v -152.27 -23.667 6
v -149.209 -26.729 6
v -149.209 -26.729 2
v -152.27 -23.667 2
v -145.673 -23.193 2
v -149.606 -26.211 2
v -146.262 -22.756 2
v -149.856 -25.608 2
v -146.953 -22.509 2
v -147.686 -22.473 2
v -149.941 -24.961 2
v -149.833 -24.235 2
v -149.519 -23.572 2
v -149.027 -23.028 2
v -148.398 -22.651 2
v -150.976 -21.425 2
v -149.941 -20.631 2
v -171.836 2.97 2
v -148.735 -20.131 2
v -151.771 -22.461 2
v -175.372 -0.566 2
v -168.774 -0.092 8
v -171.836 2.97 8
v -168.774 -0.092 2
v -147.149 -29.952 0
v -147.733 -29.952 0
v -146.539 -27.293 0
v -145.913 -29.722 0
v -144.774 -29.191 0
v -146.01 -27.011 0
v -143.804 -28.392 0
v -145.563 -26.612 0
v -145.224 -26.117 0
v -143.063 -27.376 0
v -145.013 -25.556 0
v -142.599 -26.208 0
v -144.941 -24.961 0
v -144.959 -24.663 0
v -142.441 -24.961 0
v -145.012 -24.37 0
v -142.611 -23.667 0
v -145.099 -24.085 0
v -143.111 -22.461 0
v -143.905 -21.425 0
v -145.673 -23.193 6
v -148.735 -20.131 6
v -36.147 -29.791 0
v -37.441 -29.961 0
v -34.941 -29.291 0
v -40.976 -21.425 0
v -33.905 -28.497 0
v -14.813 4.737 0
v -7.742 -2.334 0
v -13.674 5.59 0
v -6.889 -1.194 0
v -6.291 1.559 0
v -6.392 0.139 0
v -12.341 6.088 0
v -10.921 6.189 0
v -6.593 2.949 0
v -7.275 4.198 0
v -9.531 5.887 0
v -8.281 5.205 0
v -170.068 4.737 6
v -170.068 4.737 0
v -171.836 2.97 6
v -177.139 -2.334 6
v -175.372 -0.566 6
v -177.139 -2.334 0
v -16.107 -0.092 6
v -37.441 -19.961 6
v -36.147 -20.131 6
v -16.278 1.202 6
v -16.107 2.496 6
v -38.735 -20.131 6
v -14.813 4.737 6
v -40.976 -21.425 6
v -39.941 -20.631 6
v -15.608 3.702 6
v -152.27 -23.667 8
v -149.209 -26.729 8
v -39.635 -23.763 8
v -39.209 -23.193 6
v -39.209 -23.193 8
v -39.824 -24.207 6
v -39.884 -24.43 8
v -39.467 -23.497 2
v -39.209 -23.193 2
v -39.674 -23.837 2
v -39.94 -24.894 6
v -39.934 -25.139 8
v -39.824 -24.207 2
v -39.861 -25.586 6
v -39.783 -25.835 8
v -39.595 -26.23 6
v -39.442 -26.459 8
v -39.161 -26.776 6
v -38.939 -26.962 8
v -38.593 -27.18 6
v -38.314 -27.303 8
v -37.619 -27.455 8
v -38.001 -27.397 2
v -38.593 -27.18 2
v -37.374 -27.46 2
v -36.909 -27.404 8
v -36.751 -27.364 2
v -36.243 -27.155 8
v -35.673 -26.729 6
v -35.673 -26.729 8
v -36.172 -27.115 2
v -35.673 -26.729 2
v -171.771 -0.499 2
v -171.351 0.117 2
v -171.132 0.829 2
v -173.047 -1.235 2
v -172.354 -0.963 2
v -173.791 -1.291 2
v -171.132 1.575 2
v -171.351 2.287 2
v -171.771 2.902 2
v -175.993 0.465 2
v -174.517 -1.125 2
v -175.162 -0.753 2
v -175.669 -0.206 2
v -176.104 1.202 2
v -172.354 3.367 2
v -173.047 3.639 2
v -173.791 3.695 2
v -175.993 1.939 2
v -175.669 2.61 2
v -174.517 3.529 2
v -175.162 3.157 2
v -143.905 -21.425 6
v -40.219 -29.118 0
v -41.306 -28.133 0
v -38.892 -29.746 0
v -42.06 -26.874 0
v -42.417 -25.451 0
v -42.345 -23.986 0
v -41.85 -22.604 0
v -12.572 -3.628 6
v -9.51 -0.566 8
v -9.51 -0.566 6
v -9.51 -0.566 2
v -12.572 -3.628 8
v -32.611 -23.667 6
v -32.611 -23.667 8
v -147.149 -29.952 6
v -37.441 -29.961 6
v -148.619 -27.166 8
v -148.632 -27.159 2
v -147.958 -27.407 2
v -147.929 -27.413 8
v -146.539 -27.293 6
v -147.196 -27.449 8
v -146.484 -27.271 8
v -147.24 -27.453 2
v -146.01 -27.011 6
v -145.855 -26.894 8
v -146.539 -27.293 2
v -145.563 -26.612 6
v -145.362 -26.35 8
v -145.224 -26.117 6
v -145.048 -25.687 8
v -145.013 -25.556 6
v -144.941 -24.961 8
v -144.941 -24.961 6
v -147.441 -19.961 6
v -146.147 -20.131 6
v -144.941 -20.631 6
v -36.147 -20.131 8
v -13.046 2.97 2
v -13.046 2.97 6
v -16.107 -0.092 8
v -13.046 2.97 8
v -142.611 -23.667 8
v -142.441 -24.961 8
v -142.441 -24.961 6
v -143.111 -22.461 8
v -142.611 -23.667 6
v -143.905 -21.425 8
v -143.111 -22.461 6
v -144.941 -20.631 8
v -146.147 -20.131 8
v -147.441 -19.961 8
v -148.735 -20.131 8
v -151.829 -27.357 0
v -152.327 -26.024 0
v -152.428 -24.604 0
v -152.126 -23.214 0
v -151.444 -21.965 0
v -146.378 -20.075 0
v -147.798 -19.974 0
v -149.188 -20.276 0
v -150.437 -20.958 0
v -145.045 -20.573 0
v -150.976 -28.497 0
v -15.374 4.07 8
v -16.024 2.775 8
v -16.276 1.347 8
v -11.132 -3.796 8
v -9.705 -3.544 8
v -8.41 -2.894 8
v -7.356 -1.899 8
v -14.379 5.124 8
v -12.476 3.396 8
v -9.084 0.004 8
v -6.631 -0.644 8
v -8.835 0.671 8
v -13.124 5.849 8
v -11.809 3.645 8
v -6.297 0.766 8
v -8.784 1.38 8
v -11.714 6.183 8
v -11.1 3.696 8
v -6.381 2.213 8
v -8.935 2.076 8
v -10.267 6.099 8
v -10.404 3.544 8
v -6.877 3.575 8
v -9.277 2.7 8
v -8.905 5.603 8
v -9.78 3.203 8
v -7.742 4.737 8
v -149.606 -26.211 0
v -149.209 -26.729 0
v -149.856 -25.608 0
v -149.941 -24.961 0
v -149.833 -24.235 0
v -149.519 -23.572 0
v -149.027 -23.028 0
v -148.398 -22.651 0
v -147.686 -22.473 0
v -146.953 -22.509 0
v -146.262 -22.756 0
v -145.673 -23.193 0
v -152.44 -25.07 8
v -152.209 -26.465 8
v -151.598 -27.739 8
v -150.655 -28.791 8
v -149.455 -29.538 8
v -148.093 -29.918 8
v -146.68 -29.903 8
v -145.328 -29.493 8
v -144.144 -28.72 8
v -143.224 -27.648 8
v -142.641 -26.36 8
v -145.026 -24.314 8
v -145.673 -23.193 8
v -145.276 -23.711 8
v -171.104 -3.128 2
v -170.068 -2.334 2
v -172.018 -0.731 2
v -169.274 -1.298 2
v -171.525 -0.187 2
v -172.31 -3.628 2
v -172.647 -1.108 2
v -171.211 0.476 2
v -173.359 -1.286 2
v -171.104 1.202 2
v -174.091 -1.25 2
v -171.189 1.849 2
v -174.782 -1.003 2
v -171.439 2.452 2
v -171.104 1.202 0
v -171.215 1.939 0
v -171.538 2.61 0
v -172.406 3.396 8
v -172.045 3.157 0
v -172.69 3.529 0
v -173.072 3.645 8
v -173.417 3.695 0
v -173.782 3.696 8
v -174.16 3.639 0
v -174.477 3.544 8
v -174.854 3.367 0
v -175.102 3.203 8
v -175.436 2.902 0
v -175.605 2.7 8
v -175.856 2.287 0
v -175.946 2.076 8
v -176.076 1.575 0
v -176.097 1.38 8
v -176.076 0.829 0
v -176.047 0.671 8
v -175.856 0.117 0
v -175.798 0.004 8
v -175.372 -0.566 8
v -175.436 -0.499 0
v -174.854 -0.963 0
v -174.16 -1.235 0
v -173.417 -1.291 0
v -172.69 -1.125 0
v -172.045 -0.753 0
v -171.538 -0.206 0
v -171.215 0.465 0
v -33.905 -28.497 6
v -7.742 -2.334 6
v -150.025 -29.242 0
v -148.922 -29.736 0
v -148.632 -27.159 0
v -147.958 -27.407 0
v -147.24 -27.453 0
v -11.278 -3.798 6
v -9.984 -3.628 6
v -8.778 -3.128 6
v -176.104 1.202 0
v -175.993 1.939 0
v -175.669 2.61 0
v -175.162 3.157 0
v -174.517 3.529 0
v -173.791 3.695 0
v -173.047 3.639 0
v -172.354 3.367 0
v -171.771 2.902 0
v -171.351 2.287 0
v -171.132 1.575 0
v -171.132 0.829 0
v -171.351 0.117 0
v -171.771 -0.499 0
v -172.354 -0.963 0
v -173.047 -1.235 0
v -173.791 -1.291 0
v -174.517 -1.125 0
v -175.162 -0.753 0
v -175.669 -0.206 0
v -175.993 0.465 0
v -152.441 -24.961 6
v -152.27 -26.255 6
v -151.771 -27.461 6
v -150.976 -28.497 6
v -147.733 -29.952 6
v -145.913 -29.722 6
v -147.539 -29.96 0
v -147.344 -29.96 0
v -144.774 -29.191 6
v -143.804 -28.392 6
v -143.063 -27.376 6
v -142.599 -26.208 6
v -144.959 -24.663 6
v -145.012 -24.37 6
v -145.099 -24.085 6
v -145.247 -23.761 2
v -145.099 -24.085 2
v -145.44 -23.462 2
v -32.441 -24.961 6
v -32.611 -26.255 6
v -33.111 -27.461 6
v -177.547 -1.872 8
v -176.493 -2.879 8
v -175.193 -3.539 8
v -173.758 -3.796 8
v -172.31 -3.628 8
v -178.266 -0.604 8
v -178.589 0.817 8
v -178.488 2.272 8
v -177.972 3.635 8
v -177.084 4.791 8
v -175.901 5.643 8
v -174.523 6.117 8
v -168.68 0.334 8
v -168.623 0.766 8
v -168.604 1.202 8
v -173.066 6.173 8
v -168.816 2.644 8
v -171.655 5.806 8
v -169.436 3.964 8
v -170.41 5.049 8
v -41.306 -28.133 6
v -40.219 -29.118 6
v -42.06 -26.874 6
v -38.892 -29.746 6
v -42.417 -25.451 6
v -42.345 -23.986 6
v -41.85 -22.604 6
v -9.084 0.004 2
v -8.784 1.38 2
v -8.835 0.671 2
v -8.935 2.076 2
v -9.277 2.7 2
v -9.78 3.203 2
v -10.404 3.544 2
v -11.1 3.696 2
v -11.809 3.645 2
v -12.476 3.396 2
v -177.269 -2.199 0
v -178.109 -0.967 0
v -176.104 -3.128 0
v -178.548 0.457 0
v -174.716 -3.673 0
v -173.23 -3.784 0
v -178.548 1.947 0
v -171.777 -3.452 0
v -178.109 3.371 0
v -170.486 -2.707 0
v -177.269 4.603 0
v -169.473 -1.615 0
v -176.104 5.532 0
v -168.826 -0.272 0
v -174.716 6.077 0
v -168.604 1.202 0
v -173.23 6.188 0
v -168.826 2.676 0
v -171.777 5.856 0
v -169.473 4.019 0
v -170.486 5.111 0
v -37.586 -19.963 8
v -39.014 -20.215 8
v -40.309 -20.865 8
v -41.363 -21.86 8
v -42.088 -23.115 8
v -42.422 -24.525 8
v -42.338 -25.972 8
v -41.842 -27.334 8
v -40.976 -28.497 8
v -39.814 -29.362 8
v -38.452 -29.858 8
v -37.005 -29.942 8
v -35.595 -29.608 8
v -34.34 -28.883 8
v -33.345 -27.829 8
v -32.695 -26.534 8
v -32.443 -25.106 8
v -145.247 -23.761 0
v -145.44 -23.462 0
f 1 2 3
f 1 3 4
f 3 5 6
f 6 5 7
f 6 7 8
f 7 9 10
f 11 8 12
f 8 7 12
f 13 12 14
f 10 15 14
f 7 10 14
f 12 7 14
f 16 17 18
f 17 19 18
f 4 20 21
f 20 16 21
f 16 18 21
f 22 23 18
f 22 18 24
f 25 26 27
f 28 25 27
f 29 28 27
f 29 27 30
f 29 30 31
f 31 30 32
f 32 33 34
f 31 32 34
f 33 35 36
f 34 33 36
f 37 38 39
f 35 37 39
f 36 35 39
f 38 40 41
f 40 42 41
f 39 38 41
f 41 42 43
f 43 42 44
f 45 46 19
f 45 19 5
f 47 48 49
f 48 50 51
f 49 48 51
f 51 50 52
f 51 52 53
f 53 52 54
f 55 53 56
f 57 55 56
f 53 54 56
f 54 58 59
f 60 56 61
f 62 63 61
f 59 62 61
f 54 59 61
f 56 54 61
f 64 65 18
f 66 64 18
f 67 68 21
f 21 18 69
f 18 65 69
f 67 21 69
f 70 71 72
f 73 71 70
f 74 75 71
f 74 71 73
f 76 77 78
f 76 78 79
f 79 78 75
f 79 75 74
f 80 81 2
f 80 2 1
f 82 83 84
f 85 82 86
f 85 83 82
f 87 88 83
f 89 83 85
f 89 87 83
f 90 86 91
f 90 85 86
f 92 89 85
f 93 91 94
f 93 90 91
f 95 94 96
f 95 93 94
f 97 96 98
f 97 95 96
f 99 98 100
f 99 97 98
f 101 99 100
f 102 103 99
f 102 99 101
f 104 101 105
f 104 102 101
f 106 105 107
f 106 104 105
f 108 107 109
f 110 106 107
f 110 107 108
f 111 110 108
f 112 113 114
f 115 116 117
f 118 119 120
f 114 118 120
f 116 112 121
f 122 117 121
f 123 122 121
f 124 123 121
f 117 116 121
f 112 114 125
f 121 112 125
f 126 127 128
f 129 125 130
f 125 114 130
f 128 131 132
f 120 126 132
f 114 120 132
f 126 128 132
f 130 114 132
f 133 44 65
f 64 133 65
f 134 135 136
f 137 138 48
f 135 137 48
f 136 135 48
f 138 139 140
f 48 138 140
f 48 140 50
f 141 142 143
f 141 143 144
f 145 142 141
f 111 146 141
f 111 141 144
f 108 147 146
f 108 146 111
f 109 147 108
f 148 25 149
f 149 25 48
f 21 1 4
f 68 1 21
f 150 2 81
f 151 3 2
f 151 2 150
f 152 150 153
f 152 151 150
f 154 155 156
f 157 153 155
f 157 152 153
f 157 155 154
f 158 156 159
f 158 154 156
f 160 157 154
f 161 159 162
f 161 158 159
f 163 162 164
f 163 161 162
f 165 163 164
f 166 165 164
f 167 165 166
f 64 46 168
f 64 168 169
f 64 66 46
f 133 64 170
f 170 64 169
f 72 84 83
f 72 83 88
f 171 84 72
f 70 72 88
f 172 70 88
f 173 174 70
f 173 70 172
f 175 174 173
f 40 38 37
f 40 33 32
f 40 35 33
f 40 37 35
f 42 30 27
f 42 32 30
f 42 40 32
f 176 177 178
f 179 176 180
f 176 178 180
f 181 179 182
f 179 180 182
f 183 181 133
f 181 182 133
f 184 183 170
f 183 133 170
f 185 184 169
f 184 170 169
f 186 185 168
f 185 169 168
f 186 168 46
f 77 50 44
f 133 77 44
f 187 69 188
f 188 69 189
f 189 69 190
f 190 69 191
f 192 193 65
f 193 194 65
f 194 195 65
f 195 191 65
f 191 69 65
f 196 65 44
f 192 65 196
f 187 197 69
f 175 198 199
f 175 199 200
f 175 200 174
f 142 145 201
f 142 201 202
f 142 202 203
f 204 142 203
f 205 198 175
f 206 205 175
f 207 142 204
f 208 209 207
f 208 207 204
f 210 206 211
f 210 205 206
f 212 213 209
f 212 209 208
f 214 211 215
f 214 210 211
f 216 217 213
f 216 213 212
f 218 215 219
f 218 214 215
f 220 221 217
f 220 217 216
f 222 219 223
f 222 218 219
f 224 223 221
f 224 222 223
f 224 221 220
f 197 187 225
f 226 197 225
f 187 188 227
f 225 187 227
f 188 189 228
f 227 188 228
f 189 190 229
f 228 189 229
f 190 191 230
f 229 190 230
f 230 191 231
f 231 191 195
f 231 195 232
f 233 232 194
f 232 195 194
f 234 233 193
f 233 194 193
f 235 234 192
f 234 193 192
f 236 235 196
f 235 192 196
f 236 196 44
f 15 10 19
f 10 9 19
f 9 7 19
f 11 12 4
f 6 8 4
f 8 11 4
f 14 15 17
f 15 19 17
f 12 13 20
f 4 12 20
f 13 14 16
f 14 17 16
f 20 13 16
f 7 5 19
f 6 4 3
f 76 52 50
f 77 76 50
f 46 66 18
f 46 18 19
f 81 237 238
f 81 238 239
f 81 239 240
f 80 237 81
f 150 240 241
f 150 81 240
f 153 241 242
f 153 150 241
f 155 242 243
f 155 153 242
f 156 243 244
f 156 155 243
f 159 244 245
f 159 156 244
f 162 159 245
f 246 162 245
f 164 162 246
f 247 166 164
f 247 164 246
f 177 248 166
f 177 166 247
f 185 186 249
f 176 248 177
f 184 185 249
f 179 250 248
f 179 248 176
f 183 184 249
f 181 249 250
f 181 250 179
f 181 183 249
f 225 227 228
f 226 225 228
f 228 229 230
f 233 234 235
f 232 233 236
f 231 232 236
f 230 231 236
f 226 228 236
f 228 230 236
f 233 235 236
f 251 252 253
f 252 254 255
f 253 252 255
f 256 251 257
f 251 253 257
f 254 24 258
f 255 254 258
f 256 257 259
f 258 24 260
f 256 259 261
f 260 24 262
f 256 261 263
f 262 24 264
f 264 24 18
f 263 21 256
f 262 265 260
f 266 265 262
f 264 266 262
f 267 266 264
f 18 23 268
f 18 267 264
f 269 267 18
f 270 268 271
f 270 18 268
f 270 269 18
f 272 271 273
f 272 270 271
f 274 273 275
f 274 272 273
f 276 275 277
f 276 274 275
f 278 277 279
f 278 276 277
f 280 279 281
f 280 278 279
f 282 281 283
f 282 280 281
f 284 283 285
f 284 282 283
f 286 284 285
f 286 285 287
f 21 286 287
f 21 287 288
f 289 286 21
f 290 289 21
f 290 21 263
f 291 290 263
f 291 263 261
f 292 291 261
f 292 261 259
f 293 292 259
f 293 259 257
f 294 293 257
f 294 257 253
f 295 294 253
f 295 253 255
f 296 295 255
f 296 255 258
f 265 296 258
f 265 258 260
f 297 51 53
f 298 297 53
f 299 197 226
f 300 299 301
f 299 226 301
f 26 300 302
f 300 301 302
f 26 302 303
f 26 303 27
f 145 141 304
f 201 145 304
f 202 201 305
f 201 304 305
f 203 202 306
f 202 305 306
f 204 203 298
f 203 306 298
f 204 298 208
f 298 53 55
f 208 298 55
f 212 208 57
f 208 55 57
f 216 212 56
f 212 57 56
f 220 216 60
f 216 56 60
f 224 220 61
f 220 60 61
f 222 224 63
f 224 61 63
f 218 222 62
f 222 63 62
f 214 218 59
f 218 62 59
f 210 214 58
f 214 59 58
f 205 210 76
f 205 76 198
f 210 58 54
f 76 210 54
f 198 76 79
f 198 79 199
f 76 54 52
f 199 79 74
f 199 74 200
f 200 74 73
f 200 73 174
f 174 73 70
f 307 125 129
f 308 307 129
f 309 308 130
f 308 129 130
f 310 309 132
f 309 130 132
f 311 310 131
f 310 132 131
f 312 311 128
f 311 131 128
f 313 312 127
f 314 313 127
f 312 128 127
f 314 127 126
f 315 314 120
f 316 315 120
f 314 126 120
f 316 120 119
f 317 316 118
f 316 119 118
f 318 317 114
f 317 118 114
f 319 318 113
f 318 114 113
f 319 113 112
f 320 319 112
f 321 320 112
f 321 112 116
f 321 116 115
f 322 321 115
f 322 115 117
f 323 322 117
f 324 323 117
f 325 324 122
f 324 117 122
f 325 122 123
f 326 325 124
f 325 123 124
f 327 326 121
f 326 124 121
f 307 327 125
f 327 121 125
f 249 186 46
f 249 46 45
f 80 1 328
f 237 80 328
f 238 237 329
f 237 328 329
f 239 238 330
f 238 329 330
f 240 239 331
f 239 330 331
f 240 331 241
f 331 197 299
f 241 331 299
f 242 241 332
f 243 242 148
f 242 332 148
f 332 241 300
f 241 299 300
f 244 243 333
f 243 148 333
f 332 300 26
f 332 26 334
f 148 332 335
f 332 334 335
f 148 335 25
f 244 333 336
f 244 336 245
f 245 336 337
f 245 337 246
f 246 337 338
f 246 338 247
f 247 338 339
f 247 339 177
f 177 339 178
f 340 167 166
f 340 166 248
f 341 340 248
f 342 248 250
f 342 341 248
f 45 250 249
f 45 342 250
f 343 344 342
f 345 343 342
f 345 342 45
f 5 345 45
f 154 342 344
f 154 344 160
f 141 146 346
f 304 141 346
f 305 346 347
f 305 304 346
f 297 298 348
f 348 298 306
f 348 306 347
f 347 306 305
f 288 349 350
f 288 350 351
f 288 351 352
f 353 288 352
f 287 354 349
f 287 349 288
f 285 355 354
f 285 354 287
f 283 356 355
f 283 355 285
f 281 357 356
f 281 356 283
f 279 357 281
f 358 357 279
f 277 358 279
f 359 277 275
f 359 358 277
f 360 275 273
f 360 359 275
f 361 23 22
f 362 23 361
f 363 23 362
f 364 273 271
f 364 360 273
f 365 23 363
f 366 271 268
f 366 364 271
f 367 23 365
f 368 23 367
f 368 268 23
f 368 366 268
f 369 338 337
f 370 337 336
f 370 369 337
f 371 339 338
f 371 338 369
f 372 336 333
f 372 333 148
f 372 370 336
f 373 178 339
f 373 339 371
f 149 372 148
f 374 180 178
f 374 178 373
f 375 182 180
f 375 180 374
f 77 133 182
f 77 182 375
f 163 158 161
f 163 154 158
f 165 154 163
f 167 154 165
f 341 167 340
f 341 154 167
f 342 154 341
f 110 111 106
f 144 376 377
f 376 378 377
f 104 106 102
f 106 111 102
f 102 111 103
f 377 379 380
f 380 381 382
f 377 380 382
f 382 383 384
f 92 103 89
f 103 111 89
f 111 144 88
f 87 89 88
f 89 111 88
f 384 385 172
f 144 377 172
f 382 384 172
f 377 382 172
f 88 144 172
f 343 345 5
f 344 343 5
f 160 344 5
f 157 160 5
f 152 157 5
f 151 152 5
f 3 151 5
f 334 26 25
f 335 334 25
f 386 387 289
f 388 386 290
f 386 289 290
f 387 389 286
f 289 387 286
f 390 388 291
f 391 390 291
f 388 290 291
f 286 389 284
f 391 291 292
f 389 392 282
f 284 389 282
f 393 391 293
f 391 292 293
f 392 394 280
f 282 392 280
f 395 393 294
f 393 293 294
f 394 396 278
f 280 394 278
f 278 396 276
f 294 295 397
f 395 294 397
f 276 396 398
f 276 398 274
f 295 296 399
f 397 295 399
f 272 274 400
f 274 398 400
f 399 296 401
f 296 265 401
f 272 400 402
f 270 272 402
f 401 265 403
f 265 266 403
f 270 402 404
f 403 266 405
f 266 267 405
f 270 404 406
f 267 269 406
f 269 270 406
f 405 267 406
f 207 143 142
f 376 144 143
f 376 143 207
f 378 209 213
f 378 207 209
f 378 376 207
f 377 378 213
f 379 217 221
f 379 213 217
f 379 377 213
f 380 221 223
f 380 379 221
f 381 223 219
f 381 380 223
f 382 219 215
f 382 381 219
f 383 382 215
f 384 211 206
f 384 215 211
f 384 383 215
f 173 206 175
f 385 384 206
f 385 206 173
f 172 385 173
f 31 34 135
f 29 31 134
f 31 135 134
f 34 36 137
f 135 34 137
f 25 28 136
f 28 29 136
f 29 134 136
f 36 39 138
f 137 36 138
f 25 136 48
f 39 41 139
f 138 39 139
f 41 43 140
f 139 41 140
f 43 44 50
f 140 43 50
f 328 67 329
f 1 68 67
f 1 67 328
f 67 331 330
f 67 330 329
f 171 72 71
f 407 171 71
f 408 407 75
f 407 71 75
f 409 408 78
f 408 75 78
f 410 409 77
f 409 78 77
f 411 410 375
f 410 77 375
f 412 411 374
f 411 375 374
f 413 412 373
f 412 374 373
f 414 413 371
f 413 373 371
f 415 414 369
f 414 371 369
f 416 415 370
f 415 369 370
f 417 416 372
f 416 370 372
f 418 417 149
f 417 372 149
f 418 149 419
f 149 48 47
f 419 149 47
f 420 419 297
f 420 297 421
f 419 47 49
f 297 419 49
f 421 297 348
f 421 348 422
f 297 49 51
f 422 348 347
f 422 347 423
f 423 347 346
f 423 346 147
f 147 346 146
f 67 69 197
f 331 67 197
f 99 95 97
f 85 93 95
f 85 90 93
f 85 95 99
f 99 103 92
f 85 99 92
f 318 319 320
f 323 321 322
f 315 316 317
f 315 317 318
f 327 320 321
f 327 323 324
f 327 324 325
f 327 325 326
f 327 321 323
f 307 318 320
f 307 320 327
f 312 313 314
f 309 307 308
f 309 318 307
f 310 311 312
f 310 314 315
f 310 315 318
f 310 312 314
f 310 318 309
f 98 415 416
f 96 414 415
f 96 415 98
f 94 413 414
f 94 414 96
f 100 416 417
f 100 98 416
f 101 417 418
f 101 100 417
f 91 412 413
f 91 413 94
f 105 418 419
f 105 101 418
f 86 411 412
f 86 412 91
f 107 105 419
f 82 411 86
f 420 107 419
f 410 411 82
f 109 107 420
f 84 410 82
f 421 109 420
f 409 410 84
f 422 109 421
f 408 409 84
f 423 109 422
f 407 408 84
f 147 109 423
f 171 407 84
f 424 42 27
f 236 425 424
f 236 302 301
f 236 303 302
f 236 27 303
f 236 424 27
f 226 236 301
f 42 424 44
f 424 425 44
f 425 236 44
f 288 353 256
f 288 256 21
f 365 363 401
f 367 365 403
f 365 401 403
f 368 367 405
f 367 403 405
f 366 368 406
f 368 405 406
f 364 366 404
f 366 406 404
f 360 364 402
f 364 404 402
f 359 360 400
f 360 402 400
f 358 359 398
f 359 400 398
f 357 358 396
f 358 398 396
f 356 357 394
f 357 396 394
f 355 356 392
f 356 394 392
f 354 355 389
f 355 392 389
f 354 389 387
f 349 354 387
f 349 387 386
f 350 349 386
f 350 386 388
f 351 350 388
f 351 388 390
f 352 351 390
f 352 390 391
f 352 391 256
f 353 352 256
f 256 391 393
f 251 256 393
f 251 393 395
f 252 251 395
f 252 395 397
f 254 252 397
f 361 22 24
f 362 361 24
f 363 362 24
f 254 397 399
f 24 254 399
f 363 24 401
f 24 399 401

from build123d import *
from build123d.topology import SkipClean

# Parameters (mm, degrees)
SKETCH_1_R            = 5
SKETCH_1_R_2          = 2.5
EXTRUDE_1_DEPTH       = 10
EXTRUDE_1_2_DEPTH     = 10
EXTRUDE_1_3_DEPTH     = 10
EXTRUDE_1_4_DEPTH     = 10
EXTRUDE_2_DEPTH       = 6
CUT_EXTRUDE_1_DEPTH   = 4
EXTRUDE_START         = -2
EXTRUDE_3_OUTLINE_R   = 2.5
EXTRUDE_3_DEPTH       = 2
EXTRUDE_3_2_DEPTH     = 2
EXTRUDE_3_3_OUTLINE_R = 2.5
EXTRUDE_3_3_DEPTH     = 2
CUT_EXTRUDE_2_DEPTH   = 4
CUT_EXTRUDE_6_DEPTH   = 8
EXTRUDE_4_DEPTH       = 6
CUT_EXTRUDE_START     = -2
CUT_EXTRUDE_8_DEPTH   = 2
CUT_EXTRUDE_8_2_DEPTH = 2


with BuildPart() as part:
    # Эскиз1 → Бобышка-Вытянуть1 (new body)
    with BuildSketch(Plane.XY):
        with Locations((-11.277859903, 1.201925786)):
            Circle(SKETCH_1_R)
        with Locations((-11.277859903, 1.201925786)):
            Circle(SKETCH_1_R_2, mode=Mode.SUBTRACT)
    extrude(amount=EXTRUDE_1_DEPTH)



with BuildPart() as body_2:
    # Эскиз1 → Extrude 1 2 (new body)
    with BuildSketch(Plane.XY):
        with Locations((-37.440810807, -24.961025118)):
            Circle(SKETCH_1_R)
        with Locations((-37.440810807, -24.961025118)):
            Circle(SKETCH_1_R_2, mode=Mode.SUBTRACT)
    extrude(amount=EXTRUDE_1_2_DEPTH)


with BuildPart() as body_3:
    # Эскиз1 → Extrude 1 3 (new body)
    with BuildSketch(Plane.XY):
        with Locations((-147.440810807, -24.961025118)):
            Circle(SKETCH_1_R)
        with Locations((-147.440810807, -24.961025118)):
            Circle(SKETCH_1_R_2, mode=Mode.SUBTRACT)
    extrude(amount=EXTRUDE_1_3_DEPTH)


with BuildPart() as body_4:
    # Эскиз1 → Extrude 1 4 (new body)
    with BuildSketch(Plane.XY):
        with Locations((-173.603761711, 1.201925786)):
            Circle(SKETCH_1_R)
        with Locations((-173.603761711, 1.201925786)):
            Circle(SKETCH_1_R_2, mode=Mode.SUBTRACT)
    extrude(amount=EXTRUDE_1_4_DEPTH)


with BuildPart() as part_1:
    add(part.part)

    add(body_2.part)  # Бобышка-Вытянуть2 merges body 2
    # Эскиз3 → Бобышка-Вытянуть2 (add)
    with BuildSketch(Plane(origin=(0, 0, 0), x_dir=(-1, 0, 0), z_dir=(0, 0, -1))):
        Polygon((11.277859903, 1.201925786), (14.813393809, 4.737459692), (40.976344713, -21.425491212), (33.905276901, -28.496559024), (7.742325997, -2.33360812), align=None)
        Polygon((147.440810807, -24.961025118), (143.905276901, -21.425491212), (170.068227805, 4.737459692), (177.139295617, -2.33360812), (150.976344713, -28.496559024), align=None)
    extrude(amount=-EXTRUDE_2_DEPTH)

    # Эскиз4 → Вырез-Вытянуть1 (cut)
    with BuildSketch(Plane.XY.offset(6)):
        Polygon((-13.045626856, 2.969692739), (-9.51009295, -0.565841167), (-35.673043854, -26.728792071), (-39.20857776, -23.193258165), align=None)
    extrude(amount=-CUT_EXTRUDE_1_DEPTH, mode=Mode.SUBTRACT)

    # Extrude 3 2 outline → Extrude 3 2 (add)
    with BuildSketch(Plane(origin=(0, 0, 0), x_dir=(-1, 0, 0), z_dir=(0, 0, -1)).offset(EXTRUDE_START)):
        with BuildLine():
            Line((9.51009295, -0.565841167), (13.045626856, 2.969692739))
            ThreePointArc((13.045626856, 2.969692739), (9.51009295, 2.969692739), (9.51009295, -0.565841167))
        make_face()
        with BuildLine():
            Line((39.20857776, -23.193258165), (35.673043854, -26.728792071))
            ThreePointArc((35.673043854, -26.728792071), (39.20857776, -26.728792071), (39.20857776, -23.193258165))
        make_face()
    extrude(amount=EXTRUDE_3_2_DEPTH)

    # Эскиз4<2> → Вырез-Вытянуть2 (cut)
    with BuildSketch(Plane.XY.offset(6)):
        Polygon((-13.045626856, 2.969692739), (-9.51009295, -0.565841167), (-35.673043854, -26.728792071), (-39.20857776, -23.193258165), align=None)
    extrude(amount=CUT_EXTRUDE_2_DEPTH, mode=Mode.SUBTRACT)


with BuildPart() as body_4_2:
    # Бобышка-Вытянуть3: read off the stored shape, not the designer's step
    # Бобышка-Вытянуть3 outline → Бобышка-Вытянуть3 (new body)
    with BuildSketch(Plane(origin=(0, 0, 0), x_dir=(-1, 0, 0), z_dir=(0, 0, -1)).offset(EXTRUDE_START)):
        with Locations((173.603761711, 1.201925786)):
            Circle(EXTRUDE_3_OUTLINE_R)
    extrude(amount=EXTRUDE_3_DEPTH)


with BuildPart() as body_5:
    # Extrude 3 3 outline → Extrude 3 3 (new body)
    with BuildSketch(Plane(origin=(0, 0, 0), x_dir=(-1, 0, 0), z_dir=(0, 0, -1)).offset(EXTRUDE_START)):
        with Locations((147.440810807, -24.961025118)):
            Circle(EXTRUDE_3_3_OUTLINE_R)
    extrude(amount=EXTRUDE_3_3_DEPTH)


with BuildPart() as cut_extrude_6_tool:
    # Эскиз9 → Вырез-Вытянуть6 (new body)
    with BuildSketch(Plane.XY.offset(10)):
        Polygon((-173.603761711, 1.201925786), (-171.835994758, 2.969692739), (-145.673043854, -23.193258165), (-149.20857776, -26.728792071), (-175.371528664, -0.565841167), align=None)
    extrude(amount=-CUT_EXTRUDE_6_DEPTH)


with BuildPart() as part_2:
    add(part_1.part)

    # Вырез-Вытянуть6: cut by cut_extrude_6_tool
    add(cut_extrude_6_tool.part, mode=Mode.SUBTRACT)



with BuildPart() as body_3_1:
    add(body_3.part)

    # Вырез-Вытянуть6: cut by cut_extrude_6_tool
    add(cut_extrude_6_tool.part, mode=Mode.SUBTRACT)


with BuildPart() as body_4_1:
    add(body_4.part)

    # Вырез-Вытянуть6: cut by cut_extrude_6_tool
    add(cut_extrude_6_tool.part, mode=Mode.SUBTRACT)

    # Вырез-Вытянуть8: read off the stored shape, not the designer's step
    # Вырез-Вытянуть8 outline → Вырез-Вытянуть8 (cut)
    with BuildSketch(Plane.XY.offset(10).offset(CUT_EXTRUDE_START)):
        with BuildLine():
            ThreePointArc((-168.774132579, -0.092169439), (-177.139295617, 4.737459691), (-172.309666485, -3.627703345))
            Line((-172.309666485, -3.627703345), (-175.371528664, -0.565841167))
            ThreePointArc((-175.371528664, -0.565841167), (-175.371528664, 2.969692739), (-171.835994758, 2.969692739))
            Line((-171.835994758, 2.969692739), (-168.774132579, -0.092169439))
        make_face()
    extrude(amount=CUT_EXTRUDE_8_DEPTH, mode=Mode.SUBTRACT)


with BuildPart() as part_3:
    with SkipClean():  # the faces are left unmerged after this step: merging them gives an invalid solid
        add(part_2.part)

        add(body_3_1.part)  # Бобышка-Вытянуть4 merges body 3

        add(body_5.part)  # Бобышка-Вытянуть4 merges body 5
        # Эскиз10 → Бобышка-Вытянуть4 (add)
        with BuildSketch(Plane(origin=(0, 0, 0), x_dir=(-1, 0, 0), z_dir=(0, 0, -1))):
            Polygon((40.976344713, -21.425491212), (143.905276901, -21.425491212), (147.733498282, -29.952451171), (37.440810807, -29.961025118), align=None)
        extrude(amount=-EXTRUDE_4_DEPTH)

    # Cut-Extrude 8 2 outline → Cut-Extrude 8 2 (cut)
    with SkipClean():  # the faces are left unmerged after this step: merging them gives an invalid solid
        with BuildSketch(Plane.XY.offset(10).offset(CUT_EXTRUDE_START)):
            with BuildLine():
                Line((-32.611181676, -23.666929892), (-35.673043854, -26.728792071))
                ThreePointArc((-35.673043854, -26.728792071), (-39.20857776, -26.728792071), (-39.20857776, -23.193258165))
                Line((-39.20857776, -23.193258165), (-36.146715581, -20.131395986))
                ThreePointArc((-36.146715581, -20.131395986), (-40.976344714, -28.496559023), (-32.611181676, -23.666929892))
            make_face()
            with BuildLine():
                Line((-9.51009295, -0.565841167), (-12.571955129, -3.627703345))
                ThreePointArc((-12.571955129, -3.627703345), (-7.742325998, 4.737459693), (-16.107489035, -0.092169439))
                Line((-16.107489035, -0.092169439), (-13.045626856, 2.969692739))
                ThreePointArc((-13.045626856, 2.969692739), (-9.51009295, 2.969692739), (-9.51009295, -0.565841167))
            make_face()
            with BuildLine():
                ThreePointArc((-152.270439938, -23.666929892), (-143.905276901, -28.496559024), (-148.734906032, -20.131395986))
                Line((-148.734906032, -20.131395986), (-145.673043854, -23.193258165))
                ThreePointArc((-145.673043854, -23.193258165), (-145.673043854, -26.728792071), (-149.20857776, -26.728792071))
                Line((-149.20857776, -26.728792071), (-152.270439938, -23.666929892))
            make_face()
        extrude(amount=CUT_EXTRUDE_8_2_DEPTH, mode=Mode.SUBTRACT)


solid = Compound([body_4_2.part, body_4_1.part, part_3.part])
